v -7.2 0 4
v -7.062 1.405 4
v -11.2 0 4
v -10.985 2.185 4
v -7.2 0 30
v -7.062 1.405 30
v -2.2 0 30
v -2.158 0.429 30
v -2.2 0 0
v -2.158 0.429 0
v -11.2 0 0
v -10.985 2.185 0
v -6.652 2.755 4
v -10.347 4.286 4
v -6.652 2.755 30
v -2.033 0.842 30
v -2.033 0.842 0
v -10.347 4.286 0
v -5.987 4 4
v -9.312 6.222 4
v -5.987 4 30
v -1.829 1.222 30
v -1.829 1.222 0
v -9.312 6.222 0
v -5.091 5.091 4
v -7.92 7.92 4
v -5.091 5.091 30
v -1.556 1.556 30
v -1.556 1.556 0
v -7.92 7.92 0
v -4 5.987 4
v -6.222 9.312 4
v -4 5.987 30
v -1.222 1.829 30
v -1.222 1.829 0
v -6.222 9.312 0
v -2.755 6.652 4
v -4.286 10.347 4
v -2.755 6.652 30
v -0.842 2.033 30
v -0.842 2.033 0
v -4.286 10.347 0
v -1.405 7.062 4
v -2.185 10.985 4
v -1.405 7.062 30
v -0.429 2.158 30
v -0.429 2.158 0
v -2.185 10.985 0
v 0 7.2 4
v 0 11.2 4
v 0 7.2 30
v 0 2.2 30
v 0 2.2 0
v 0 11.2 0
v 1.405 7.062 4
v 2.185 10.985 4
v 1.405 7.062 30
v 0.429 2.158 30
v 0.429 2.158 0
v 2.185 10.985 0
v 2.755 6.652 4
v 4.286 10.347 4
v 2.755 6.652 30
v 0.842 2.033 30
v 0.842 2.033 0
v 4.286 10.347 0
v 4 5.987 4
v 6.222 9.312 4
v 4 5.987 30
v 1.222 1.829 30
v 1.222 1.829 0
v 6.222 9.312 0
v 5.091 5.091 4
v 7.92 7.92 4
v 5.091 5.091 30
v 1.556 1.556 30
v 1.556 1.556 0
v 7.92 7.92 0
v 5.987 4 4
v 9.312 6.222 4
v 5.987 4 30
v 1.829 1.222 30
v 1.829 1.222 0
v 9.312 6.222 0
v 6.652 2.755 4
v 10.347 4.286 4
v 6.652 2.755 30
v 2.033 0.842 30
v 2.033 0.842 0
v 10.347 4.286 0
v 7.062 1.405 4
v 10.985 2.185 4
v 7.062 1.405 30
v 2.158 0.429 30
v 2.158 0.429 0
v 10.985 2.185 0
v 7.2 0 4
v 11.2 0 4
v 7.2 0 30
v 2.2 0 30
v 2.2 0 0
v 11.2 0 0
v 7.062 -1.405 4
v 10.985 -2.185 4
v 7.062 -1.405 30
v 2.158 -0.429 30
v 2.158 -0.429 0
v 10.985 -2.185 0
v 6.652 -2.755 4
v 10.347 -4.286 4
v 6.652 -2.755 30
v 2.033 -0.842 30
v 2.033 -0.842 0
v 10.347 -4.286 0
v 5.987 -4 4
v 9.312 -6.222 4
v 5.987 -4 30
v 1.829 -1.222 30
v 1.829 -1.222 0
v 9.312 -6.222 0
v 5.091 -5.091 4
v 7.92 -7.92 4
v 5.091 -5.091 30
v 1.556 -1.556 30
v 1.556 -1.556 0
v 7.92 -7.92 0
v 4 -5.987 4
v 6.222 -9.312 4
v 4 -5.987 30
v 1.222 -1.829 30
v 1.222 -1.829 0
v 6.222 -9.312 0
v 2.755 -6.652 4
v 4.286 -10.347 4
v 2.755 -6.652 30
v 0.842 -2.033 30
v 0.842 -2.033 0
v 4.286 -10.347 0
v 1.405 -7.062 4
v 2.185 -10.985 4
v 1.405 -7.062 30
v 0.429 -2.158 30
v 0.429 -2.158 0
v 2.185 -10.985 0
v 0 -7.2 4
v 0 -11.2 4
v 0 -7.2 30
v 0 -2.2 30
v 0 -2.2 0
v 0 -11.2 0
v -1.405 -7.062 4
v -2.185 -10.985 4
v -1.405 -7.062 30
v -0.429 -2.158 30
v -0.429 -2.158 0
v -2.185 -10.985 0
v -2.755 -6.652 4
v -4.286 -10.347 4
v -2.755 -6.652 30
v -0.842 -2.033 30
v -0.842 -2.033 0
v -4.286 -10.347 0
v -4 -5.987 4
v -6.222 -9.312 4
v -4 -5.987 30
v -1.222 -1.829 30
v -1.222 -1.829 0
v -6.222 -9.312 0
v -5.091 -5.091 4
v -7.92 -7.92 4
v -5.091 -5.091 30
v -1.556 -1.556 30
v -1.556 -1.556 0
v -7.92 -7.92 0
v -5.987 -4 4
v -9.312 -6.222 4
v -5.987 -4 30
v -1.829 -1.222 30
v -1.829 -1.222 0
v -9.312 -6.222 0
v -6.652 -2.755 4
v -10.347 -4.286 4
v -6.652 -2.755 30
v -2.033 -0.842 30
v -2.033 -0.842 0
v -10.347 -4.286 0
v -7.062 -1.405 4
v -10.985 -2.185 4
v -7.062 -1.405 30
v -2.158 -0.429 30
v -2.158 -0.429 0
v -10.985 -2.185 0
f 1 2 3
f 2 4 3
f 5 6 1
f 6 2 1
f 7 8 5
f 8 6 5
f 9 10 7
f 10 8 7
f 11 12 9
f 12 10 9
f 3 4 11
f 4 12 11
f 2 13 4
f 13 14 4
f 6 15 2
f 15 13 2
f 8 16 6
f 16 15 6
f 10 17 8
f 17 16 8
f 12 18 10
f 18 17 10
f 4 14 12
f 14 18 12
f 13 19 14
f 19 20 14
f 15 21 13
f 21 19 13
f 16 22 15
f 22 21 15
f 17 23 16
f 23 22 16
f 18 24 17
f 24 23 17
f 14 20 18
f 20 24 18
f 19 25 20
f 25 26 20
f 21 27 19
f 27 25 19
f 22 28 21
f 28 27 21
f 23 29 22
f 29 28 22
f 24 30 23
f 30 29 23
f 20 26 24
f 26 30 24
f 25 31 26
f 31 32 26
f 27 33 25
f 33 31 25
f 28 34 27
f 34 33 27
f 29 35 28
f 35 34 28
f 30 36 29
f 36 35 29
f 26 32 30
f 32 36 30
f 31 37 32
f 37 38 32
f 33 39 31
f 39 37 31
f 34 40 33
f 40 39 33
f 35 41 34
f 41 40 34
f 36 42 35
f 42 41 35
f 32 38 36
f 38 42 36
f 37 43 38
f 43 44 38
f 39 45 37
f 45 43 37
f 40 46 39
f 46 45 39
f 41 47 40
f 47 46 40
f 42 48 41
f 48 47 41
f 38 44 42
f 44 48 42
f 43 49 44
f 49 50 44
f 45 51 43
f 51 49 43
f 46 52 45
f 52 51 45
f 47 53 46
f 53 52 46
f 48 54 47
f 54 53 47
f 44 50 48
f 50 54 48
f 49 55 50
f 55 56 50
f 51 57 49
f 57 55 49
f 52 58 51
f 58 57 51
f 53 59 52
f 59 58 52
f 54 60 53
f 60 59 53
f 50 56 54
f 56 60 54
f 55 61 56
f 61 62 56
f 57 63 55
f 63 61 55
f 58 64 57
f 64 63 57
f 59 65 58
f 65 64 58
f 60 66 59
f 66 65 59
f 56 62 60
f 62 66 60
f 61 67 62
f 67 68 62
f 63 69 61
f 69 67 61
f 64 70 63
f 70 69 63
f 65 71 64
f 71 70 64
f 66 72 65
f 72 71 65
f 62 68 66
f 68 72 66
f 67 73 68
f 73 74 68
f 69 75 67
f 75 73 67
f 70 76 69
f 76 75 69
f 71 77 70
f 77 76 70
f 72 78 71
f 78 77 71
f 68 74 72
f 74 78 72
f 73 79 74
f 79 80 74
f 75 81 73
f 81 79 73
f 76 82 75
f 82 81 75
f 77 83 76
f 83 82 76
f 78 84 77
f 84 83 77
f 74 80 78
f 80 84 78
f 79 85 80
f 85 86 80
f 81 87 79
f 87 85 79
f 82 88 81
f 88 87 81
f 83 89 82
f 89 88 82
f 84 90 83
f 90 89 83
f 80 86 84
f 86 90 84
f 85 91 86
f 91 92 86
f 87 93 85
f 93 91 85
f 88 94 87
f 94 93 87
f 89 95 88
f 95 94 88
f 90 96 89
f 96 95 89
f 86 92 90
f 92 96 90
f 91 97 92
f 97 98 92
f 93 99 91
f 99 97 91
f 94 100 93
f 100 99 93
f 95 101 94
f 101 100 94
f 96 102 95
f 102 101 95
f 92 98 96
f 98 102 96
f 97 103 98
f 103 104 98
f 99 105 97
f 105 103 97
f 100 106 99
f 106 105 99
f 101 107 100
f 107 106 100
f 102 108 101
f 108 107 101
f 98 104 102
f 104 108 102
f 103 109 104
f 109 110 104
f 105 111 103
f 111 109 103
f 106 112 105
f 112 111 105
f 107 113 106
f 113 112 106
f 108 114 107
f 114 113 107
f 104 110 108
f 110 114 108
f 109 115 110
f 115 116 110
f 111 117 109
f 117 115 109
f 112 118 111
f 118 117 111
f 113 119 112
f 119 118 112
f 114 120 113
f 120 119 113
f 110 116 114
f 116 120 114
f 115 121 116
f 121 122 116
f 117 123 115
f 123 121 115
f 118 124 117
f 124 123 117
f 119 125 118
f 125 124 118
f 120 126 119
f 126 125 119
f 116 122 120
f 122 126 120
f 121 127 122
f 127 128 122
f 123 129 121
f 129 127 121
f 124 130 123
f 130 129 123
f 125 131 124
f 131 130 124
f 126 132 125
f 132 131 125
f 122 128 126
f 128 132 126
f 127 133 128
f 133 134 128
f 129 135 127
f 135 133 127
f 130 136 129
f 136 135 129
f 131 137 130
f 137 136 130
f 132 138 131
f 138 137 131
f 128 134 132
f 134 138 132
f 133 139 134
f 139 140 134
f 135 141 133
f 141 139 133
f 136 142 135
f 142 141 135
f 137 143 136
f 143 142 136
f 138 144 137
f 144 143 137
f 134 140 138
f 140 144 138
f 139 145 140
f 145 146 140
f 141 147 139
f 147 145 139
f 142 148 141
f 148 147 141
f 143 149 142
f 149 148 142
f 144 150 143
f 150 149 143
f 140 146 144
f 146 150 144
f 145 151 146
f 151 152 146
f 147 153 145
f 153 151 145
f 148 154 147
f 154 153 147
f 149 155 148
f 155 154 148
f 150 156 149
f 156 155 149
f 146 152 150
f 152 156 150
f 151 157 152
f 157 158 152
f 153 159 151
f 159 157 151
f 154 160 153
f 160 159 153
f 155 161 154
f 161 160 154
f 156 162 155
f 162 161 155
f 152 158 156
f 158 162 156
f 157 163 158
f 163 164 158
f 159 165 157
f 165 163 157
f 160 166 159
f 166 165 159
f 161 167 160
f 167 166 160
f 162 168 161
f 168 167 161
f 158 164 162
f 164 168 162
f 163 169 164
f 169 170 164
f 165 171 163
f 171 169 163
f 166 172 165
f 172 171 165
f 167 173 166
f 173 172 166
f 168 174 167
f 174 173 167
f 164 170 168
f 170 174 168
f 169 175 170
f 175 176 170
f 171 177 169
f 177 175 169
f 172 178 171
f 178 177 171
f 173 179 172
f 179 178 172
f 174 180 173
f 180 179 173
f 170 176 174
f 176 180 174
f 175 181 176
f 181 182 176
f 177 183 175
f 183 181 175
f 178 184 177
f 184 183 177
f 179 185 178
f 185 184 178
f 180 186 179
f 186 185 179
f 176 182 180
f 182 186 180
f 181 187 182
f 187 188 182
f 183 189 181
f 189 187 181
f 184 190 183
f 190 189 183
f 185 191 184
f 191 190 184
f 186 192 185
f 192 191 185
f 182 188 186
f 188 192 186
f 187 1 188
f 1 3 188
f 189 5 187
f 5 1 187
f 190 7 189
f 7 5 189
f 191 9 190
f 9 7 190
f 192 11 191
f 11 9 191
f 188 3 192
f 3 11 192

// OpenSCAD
$fn = 32;

// ----------------------------------------------------------------------
// Profiled standoff: flanged spacer, 30 mm long, bore 4.4 mm
// ----------------------------------------------------------------------

// --- parameters (mm) ---
revolve_angle = 360;      // full turn around the Z axis
profile_points = 6;       // points of the closed outline

profile = [[2.2, 0], [11.2, 0], [11.2, 4], [7.2, 4], [7.2, 30], [2.2, 30]];  // single closed polygon, 6 points, counter clockwise

// --- the one profile operation ---
rotate_extrude(angle = revolve_angle) polygon(points = profile);
